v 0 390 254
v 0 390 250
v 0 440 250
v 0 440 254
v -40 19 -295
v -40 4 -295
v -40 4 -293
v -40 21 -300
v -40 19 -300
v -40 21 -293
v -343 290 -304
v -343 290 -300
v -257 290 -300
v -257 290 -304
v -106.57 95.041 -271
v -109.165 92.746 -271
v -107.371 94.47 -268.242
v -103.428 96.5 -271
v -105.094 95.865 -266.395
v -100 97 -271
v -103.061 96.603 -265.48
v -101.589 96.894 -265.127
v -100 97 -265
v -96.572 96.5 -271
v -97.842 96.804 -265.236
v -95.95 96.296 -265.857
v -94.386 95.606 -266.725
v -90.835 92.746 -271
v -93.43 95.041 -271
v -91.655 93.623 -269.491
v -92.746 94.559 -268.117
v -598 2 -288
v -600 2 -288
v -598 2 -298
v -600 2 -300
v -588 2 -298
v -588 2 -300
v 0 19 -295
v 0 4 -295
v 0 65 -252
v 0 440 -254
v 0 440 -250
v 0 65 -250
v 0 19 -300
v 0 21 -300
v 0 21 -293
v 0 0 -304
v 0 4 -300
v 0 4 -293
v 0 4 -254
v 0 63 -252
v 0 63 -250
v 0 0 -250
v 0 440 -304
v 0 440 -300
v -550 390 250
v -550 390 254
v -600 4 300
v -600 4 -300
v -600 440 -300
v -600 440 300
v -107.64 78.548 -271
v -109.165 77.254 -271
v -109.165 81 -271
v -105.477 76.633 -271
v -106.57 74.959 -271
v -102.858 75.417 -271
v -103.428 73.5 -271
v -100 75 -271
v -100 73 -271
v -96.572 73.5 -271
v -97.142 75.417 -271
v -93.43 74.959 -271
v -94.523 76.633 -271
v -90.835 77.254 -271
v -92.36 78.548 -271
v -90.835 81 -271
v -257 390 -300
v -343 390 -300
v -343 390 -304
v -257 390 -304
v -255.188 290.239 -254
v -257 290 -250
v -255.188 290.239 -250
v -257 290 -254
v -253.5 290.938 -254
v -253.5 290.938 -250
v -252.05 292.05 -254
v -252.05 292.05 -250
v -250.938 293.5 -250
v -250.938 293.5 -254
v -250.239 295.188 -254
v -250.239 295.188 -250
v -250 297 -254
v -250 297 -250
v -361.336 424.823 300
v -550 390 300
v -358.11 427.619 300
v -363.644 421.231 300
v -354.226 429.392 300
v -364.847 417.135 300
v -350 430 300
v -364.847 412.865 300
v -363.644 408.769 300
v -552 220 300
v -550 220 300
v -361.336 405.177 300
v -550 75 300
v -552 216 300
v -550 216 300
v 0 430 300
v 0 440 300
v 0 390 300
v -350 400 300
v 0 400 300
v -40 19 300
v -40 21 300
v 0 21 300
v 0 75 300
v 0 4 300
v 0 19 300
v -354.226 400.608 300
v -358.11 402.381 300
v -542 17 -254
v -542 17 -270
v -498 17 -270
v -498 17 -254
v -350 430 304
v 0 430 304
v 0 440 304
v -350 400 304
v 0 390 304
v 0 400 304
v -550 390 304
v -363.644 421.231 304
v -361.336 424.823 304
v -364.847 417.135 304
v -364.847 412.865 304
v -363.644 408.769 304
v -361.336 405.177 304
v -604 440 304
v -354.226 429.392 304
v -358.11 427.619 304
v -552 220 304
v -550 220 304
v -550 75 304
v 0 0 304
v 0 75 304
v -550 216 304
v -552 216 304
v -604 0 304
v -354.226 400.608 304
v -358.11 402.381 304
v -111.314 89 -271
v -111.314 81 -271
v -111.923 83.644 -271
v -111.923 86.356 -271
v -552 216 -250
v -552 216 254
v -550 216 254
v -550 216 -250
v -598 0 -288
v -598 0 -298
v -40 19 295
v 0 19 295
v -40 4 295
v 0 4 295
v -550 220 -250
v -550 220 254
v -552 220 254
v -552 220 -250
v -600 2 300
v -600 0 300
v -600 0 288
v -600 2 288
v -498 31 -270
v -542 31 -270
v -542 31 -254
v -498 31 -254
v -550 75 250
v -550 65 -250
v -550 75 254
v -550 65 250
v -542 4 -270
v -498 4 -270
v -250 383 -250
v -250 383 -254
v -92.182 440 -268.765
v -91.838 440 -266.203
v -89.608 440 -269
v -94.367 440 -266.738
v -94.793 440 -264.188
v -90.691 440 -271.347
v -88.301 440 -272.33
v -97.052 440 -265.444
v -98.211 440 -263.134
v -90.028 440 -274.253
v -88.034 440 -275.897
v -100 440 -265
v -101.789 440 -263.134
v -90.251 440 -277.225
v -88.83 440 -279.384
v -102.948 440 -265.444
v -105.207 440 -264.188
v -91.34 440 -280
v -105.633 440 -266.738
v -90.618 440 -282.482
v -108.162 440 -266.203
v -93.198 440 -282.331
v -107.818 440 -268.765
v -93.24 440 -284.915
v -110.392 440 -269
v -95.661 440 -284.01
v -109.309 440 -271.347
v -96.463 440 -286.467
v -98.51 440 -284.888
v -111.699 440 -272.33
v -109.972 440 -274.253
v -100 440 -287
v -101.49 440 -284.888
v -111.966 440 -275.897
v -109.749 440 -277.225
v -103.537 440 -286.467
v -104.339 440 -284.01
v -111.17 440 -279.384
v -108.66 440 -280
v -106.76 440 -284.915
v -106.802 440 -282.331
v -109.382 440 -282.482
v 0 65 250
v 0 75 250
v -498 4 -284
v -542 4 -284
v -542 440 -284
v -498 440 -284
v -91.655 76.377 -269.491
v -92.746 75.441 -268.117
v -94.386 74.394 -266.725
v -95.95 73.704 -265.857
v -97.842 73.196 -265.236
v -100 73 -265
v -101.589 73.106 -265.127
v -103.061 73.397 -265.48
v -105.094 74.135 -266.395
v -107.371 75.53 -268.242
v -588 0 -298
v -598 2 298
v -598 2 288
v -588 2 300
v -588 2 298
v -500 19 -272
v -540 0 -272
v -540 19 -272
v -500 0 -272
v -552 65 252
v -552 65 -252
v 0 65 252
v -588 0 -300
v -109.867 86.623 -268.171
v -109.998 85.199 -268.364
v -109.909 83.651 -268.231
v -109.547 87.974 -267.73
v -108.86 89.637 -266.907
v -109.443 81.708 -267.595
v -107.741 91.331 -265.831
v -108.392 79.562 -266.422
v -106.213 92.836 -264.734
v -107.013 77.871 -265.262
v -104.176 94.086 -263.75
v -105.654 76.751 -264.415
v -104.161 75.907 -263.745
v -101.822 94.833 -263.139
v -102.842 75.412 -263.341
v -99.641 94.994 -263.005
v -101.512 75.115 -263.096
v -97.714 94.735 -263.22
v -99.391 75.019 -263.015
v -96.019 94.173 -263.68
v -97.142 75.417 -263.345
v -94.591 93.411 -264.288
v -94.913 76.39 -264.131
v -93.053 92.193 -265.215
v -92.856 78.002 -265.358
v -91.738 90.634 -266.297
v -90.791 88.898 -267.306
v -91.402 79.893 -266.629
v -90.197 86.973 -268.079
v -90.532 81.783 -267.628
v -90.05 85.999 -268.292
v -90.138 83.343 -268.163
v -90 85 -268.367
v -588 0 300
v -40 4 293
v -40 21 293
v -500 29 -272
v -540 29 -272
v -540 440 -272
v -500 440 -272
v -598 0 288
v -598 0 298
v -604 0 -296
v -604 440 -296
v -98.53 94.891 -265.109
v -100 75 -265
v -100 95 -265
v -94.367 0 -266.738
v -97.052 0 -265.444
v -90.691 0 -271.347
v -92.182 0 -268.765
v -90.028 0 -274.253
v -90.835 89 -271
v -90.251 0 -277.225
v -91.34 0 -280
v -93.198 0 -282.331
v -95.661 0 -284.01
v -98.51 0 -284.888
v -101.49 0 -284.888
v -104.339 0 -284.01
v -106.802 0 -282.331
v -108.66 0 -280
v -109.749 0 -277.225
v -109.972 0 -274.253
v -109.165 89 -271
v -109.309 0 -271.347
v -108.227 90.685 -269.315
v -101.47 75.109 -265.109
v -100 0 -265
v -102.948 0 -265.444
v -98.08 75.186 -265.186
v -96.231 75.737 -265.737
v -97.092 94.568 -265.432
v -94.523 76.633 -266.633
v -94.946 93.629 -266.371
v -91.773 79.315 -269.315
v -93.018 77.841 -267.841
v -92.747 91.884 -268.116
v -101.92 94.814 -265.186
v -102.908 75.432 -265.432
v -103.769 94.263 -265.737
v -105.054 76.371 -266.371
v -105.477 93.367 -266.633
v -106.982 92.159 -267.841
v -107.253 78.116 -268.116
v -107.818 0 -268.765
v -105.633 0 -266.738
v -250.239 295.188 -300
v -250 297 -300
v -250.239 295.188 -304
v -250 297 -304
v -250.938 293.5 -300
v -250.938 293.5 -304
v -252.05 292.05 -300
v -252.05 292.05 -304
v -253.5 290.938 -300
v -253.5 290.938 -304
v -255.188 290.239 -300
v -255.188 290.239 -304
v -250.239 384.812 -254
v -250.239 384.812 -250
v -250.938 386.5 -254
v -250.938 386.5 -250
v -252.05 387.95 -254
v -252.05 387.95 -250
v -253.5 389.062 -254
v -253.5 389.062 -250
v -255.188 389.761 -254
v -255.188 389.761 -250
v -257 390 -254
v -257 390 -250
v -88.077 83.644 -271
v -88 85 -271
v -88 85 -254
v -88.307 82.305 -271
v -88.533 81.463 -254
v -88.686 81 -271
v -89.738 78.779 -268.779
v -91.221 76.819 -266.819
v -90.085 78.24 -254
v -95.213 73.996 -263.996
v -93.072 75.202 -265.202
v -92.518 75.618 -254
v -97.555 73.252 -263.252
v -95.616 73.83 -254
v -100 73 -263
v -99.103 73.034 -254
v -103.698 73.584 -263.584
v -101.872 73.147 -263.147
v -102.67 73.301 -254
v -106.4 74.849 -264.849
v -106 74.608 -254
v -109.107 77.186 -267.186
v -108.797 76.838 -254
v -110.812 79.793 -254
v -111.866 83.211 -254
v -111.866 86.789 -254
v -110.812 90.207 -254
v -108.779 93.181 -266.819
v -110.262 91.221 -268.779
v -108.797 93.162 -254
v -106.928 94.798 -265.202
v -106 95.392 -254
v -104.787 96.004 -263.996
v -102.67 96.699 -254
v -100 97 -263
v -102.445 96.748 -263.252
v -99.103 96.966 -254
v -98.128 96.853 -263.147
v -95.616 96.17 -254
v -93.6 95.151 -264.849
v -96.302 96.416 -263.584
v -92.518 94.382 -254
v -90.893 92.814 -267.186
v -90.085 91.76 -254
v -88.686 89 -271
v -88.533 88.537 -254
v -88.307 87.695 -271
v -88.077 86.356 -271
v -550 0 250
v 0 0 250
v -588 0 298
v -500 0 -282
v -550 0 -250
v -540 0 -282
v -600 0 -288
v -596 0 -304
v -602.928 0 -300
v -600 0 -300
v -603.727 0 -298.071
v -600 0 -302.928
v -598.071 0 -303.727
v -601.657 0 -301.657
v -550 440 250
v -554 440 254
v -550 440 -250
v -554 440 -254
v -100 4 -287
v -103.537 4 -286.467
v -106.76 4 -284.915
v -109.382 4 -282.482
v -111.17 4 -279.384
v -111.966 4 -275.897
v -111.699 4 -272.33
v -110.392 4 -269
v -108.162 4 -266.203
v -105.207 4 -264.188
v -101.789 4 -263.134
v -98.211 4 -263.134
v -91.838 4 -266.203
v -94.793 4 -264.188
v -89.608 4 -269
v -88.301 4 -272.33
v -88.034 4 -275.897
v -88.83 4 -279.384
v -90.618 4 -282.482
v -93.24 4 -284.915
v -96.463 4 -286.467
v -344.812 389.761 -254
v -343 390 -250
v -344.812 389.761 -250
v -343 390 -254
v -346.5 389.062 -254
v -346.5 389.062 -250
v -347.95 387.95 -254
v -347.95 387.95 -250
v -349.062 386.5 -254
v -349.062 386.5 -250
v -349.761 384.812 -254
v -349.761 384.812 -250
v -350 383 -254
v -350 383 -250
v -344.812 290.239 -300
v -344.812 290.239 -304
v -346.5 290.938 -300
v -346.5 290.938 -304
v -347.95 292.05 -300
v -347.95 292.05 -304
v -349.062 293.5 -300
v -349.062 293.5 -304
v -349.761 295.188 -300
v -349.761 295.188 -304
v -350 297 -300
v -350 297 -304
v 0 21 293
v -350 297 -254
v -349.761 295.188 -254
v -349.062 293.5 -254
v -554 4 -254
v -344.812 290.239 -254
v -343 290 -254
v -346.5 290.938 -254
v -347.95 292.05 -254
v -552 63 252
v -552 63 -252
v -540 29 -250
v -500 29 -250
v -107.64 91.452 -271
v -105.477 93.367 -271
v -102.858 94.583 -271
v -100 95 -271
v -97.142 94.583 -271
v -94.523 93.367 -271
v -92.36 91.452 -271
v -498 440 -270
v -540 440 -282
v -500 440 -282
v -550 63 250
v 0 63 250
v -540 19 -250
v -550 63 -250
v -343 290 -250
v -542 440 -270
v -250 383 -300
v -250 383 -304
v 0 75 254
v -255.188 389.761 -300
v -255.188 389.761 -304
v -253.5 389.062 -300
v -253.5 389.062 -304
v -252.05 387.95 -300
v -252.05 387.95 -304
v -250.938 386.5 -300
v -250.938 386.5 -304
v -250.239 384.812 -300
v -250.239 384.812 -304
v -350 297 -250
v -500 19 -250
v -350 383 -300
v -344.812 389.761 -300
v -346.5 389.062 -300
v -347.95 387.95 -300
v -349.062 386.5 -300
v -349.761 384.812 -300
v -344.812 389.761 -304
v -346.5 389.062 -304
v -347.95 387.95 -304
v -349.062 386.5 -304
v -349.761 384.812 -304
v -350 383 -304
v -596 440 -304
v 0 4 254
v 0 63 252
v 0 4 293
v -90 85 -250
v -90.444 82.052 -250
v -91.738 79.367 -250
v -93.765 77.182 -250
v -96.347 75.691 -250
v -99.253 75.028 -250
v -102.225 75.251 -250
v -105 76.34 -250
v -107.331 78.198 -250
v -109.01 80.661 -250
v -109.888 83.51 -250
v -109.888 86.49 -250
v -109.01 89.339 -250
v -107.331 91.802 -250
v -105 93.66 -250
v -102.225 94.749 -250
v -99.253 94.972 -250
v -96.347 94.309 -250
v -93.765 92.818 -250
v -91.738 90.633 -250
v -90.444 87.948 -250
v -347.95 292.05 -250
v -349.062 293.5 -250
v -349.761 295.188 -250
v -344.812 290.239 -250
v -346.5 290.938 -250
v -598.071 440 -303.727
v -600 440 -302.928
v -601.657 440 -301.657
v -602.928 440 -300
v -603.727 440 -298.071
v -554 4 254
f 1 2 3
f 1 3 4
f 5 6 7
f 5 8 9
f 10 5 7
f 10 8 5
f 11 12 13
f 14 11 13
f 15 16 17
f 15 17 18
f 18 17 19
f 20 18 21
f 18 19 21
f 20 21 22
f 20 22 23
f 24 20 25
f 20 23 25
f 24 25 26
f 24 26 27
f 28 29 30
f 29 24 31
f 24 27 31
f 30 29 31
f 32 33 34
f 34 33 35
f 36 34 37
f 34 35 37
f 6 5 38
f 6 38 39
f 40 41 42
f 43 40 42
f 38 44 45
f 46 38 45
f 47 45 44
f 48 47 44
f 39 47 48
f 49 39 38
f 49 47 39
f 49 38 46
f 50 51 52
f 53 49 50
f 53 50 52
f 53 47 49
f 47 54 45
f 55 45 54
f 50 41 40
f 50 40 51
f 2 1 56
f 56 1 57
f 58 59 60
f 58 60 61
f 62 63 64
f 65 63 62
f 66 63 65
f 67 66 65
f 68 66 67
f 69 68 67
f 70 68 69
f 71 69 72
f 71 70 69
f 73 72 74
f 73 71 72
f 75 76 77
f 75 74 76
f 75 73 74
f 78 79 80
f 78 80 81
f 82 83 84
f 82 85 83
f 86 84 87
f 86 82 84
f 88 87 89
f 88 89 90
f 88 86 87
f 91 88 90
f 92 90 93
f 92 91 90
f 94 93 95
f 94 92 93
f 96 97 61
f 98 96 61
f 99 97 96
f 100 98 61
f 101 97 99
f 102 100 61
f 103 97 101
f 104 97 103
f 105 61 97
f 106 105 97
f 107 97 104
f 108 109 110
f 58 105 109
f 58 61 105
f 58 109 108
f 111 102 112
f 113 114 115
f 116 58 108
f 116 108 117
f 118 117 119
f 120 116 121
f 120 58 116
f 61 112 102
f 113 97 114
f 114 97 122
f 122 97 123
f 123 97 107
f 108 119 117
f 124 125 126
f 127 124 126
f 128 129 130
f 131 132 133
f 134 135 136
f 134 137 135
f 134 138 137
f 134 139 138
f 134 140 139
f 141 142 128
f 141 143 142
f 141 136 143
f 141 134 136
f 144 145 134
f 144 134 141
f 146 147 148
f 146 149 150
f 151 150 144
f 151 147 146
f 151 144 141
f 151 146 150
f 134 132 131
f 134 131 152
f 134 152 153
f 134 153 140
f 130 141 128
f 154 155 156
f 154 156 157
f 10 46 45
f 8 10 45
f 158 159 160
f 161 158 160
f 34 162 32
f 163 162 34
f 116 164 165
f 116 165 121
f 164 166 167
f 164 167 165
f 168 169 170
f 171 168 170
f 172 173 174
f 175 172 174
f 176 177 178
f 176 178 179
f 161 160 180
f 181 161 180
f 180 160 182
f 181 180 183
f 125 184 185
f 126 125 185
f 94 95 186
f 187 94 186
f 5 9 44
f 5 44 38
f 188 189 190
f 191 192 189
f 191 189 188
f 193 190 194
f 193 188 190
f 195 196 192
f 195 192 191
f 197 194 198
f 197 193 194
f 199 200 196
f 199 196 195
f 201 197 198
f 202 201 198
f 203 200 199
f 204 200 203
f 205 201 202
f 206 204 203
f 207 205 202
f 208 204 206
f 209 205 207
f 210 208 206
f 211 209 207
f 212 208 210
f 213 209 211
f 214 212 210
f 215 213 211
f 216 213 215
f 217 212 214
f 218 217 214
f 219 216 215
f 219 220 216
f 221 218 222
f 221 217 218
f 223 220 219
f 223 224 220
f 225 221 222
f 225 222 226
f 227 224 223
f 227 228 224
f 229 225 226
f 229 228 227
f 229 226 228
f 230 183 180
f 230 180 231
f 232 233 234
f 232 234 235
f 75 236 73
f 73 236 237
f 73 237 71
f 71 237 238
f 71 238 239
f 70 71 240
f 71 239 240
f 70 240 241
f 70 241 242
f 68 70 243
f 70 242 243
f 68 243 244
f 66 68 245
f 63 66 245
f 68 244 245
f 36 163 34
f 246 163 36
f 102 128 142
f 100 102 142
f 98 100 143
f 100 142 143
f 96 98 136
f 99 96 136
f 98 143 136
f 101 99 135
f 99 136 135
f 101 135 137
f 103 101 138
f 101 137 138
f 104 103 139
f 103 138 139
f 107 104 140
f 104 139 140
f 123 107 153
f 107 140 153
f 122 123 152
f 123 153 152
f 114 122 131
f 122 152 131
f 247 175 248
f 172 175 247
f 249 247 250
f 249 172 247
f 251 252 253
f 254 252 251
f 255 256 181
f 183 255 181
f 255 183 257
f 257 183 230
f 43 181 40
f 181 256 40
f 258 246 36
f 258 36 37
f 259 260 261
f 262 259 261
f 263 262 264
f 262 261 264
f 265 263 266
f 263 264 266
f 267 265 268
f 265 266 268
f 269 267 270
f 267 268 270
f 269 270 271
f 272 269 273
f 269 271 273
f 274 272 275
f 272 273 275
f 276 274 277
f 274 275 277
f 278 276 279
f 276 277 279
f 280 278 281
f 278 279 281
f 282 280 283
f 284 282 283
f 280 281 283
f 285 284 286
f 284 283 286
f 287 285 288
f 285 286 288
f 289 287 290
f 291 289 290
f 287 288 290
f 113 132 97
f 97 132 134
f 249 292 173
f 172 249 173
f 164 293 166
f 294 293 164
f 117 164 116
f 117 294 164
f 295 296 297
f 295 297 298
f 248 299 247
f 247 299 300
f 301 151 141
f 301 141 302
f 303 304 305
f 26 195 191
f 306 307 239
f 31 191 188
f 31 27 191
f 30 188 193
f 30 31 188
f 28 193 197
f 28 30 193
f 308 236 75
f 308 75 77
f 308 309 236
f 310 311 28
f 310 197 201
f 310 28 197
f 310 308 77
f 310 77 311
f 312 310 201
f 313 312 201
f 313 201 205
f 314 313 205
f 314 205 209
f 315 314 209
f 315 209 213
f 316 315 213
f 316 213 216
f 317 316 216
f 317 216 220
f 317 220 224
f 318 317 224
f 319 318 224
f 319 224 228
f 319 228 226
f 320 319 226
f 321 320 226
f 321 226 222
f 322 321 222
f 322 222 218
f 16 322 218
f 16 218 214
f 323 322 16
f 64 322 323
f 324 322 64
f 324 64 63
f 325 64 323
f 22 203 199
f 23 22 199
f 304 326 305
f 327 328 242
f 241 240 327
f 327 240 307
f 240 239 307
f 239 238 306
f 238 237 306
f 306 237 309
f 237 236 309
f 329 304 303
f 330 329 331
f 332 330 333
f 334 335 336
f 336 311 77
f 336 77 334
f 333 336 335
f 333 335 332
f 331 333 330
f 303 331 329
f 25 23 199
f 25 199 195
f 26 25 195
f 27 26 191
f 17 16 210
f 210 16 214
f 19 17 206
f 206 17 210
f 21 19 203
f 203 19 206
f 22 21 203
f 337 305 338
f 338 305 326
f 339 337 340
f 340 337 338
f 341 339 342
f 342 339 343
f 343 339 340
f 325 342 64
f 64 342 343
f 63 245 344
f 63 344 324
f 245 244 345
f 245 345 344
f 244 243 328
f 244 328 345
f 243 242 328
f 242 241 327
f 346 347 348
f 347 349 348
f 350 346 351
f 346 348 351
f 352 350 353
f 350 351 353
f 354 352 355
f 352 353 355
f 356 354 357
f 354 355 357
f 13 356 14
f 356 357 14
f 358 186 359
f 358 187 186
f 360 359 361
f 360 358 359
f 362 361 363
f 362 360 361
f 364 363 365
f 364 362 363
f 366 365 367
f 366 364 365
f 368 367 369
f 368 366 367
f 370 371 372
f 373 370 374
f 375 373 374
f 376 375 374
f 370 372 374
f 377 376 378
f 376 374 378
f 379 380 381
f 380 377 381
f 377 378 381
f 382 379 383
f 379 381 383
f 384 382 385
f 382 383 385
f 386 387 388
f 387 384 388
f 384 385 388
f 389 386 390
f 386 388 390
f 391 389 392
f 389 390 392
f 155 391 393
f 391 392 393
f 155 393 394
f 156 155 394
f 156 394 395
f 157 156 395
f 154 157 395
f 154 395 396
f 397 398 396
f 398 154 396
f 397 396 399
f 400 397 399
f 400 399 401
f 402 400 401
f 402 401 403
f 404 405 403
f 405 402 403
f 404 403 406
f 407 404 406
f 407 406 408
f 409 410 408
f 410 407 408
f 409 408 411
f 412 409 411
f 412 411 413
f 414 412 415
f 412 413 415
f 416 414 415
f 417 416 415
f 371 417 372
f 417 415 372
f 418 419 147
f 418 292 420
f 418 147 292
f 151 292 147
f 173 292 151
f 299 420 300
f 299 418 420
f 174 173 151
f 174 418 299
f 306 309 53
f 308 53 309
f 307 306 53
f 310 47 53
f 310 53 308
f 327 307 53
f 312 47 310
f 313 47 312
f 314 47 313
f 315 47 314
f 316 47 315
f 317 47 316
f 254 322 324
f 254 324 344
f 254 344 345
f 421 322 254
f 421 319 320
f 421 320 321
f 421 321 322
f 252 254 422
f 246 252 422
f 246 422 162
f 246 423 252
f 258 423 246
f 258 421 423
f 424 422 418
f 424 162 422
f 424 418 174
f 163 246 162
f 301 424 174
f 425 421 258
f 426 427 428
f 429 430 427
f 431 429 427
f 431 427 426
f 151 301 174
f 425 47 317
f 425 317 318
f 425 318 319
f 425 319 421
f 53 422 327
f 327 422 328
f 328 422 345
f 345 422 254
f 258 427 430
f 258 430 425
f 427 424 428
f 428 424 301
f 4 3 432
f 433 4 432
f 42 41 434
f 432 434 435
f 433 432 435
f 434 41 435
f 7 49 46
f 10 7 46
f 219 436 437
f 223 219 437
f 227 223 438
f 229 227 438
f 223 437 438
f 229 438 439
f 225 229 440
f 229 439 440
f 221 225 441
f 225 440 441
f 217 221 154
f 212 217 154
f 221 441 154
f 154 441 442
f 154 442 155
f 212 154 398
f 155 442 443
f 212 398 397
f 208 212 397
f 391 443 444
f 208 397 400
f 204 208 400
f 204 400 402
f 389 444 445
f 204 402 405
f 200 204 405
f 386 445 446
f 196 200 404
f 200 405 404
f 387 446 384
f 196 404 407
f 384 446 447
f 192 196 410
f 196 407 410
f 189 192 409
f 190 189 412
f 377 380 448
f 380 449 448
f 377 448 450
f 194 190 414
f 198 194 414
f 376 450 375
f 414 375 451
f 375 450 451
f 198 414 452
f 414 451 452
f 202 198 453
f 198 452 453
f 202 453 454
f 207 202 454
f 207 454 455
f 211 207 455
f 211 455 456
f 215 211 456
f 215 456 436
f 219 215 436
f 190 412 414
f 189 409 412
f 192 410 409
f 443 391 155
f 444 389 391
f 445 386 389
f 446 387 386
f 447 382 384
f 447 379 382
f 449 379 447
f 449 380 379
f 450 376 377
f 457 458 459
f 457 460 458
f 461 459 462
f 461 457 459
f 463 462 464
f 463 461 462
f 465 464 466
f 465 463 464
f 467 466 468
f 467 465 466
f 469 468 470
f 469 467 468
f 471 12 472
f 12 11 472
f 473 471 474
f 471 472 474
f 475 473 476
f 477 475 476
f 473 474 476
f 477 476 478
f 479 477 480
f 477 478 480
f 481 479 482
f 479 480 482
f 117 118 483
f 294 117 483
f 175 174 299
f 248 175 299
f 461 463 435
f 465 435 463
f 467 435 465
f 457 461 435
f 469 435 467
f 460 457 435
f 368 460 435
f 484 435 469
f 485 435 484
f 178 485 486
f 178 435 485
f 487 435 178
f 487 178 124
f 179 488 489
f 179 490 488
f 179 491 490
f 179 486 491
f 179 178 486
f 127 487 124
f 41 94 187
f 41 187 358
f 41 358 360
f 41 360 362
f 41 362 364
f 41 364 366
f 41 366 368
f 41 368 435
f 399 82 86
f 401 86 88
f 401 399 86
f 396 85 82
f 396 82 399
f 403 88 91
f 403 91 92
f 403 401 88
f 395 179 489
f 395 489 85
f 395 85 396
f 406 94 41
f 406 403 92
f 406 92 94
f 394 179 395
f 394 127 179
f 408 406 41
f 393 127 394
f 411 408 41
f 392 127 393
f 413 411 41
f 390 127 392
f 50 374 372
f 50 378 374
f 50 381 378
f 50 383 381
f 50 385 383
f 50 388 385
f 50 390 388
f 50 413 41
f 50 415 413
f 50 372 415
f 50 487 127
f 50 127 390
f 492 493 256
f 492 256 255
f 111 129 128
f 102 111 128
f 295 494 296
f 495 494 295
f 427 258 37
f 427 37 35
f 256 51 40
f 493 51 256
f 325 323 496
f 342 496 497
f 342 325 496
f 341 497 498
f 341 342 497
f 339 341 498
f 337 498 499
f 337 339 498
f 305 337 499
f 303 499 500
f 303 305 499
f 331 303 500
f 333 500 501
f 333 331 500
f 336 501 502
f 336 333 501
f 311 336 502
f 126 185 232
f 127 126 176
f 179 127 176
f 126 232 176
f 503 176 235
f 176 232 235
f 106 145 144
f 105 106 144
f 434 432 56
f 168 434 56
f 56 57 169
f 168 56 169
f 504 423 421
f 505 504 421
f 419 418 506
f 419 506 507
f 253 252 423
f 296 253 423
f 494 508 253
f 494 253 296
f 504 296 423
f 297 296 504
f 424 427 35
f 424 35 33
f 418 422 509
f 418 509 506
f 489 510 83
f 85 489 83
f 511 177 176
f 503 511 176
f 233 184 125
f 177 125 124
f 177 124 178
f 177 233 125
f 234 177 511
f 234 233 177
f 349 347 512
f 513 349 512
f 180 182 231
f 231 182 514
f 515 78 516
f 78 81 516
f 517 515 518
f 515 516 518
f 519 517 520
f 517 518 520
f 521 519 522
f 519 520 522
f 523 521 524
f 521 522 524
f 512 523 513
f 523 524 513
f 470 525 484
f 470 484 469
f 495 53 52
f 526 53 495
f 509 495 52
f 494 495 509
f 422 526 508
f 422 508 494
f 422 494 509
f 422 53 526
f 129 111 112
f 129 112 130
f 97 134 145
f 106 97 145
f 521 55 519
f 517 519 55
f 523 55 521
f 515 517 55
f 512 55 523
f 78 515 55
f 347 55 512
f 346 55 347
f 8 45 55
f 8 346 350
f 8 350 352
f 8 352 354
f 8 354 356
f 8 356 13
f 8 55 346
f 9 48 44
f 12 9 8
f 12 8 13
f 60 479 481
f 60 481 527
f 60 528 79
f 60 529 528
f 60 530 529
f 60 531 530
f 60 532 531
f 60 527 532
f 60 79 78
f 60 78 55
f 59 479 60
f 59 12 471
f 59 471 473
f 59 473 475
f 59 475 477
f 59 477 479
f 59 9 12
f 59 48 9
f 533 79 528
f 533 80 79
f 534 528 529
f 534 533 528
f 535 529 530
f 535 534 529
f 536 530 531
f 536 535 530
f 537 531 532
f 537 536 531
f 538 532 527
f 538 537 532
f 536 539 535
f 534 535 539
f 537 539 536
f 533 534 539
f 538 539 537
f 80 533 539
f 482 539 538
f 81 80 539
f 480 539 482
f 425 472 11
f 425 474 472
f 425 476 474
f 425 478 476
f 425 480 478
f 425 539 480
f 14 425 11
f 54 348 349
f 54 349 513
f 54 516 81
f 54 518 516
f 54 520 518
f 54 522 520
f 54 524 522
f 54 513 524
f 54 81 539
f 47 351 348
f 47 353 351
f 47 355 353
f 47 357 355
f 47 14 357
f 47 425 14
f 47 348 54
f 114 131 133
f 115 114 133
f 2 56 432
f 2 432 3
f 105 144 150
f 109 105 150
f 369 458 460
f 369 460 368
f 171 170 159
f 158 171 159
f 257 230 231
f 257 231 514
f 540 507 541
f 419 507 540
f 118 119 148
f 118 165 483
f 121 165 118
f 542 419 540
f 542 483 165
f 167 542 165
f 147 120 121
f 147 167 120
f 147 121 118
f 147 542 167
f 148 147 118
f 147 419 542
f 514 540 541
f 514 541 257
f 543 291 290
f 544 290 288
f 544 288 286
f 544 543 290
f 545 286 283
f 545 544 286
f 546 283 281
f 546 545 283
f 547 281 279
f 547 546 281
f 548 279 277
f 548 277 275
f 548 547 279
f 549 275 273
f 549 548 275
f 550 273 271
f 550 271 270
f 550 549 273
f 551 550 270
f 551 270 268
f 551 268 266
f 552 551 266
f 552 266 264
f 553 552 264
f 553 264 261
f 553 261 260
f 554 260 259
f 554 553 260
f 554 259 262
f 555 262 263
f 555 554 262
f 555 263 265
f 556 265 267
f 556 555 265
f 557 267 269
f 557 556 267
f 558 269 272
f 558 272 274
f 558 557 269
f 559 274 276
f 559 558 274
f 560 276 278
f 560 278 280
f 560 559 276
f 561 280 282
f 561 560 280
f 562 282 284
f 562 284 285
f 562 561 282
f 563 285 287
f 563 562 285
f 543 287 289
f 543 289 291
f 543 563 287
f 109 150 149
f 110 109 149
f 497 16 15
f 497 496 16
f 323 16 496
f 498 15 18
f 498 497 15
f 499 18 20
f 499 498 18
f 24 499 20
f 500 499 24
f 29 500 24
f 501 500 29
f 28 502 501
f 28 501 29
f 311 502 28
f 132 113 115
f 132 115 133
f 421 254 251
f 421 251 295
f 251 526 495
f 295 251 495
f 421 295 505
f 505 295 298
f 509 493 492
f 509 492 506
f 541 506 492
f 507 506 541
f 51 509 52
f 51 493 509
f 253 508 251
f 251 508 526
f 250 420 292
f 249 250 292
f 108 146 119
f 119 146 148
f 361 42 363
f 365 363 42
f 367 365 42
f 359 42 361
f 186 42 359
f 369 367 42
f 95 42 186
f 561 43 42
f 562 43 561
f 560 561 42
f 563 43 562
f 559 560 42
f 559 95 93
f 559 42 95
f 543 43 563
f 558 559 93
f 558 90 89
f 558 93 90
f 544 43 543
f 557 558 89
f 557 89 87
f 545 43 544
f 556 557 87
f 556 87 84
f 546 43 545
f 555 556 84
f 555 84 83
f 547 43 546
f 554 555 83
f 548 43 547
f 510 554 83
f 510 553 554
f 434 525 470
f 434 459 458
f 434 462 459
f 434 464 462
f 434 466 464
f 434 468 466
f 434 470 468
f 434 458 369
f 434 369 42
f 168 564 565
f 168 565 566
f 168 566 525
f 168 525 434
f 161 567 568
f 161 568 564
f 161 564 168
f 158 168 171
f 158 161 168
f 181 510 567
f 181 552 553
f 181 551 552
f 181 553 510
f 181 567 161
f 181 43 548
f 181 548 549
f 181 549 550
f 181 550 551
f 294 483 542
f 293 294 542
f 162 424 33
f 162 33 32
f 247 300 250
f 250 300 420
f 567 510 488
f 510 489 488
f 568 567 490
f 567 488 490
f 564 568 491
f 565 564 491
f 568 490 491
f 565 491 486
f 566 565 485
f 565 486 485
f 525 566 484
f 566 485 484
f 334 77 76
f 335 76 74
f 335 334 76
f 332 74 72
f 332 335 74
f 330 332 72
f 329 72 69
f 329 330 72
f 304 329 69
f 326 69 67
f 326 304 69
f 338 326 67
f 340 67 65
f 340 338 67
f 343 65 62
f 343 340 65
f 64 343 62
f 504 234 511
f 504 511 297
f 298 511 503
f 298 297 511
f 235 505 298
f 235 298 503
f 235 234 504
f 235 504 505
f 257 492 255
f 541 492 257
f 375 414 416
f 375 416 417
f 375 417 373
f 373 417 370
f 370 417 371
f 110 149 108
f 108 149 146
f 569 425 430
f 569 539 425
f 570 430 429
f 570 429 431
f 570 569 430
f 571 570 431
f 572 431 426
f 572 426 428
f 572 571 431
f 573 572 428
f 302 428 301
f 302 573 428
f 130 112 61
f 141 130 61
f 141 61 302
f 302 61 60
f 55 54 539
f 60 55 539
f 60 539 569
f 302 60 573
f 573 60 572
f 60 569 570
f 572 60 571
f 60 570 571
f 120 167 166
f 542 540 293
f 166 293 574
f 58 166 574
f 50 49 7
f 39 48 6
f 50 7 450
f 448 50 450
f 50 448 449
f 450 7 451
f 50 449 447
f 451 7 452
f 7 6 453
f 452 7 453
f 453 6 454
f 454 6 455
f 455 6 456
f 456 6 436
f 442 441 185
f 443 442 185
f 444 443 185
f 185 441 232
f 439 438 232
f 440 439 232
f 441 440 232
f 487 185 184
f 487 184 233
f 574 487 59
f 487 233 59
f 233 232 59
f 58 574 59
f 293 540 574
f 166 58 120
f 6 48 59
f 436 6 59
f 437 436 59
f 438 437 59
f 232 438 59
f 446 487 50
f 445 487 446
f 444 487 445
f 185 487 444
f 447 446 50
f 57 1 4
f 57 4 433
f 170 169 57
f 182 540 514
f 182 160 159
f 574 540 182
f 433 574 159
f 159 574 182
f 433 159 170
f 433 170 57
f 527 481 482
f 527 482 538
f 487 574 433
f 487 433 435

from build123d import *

# Parameters (mm, degrees)
BOSS_EXTRUDE1_DEPTH             = 440
BOSS_EXTRUDE2_DEPTH             = 440
BOSS_EXTRUDE3_DEPTH             = 4
SKETCH4_W                       = 500
SKETCH4_H                       = 4
CUT_EXTRUDE1_DEPTH              = 2
CUT_EXTRUDE3_DEPTH              = 1
CUT_EXTRUDE3_DEPTH_BACK         = 1
CUT_EXTRUDE6_DEPTH              = 54
BOSS_EXTRUDE6_DEPTH             = 40
BOSS_EXTRUDE5_DEPTH             = 40
CUT_EXTRUDE9_DEPTH              = 4
SKETCH14_W                      = 100
SKETCH14_H                      = 100
CUT_EXTRUDE10_DEPTH             = 931.23222907
FILLET1_R                       = 7
FILLET2_R                       = 8
CUT_EXTRUDE11_DEPTH             = 2
SKETCH17_W                      = 40
SKETCH17_H                      = 10
CUT_EXTRUDE12_DEPTH             = 10
SKETCH18_W                      = 44
SKETCH18_H                      = 14
SKETCH18_W_2                    = 40
SKETCH18_H_2                    = 10
BOSS_EXTRUDE7_DEPTH             = 436
CUT_EXTRUDE13_REACH             = 944.28
SKETCH19_W                      = 40
SKETCH19_H                      = 10
CUT_EXTRUDE13_DIRECTION_2_DEPTH = 2
SKETCH20_W                      = 44
SKETCH20_H                      = 14
SKETCH20_W_2                    = 40
SKETCH20_H_2                    = 10
BOSS_EXTRUDE8_DEPTH             = 16
SKETCH21_R                      = 10
CUT_EXTRUDE14_DEPTH             = 25
SKETCH25_R                      = 12
SKETCH25_R_2                    = 10
BOSS_EXTRUDE10_DEPTH            = 17
SKETCH22_R                      = 10
CUT_EXTRUDE15_DEPTH             = 4
SKETCH23_R                      = 12
SKETCH23_R_2                    = 10
BOSS_EXTRUDE9_DEPTH             = 436


with BuildPart() as part:
    # Sketch1 → Boss-Extrude1 (new body)
    with BuildSketch(Plane(origin=(0, 0, 0), x_dir=(1, 0, 0), z_dir=(0, 1, 0))):
        Polygon((0, 300), (-600, 300), (-600, -300), (0, -300), (0, -304), (-604, -304), (-604, 304), (0, 304), align=None)
    extrude(amount=BOSS_EXTRUDE1_DEPTH)



with BuildPart() as body_2:
    # Sketch2 → Boss-Extrude2 (new body)
    with BuildSketch(Plane(origin=(0, 0, 0), x_dir=(1, 0, 0), z_dir=(0, 1, 0))):
        Polygon((0, 250), (-550, 250), (-550, -250), (0, -250), (0, -254), (-554, -254), (-554, 254), (0, 254), align=None)
    extrude(amount=BOSS_EXTRUDE2_DEPTH)


with BuildPart() as part_1:
    add(part.part)

    add(body_2.part)  # Boss-Extrude3 merges body 2
    # Sketch3 → Boss-Extrude3 (add)
    with BuildSketch(Plane(origin=(0, 0, 0), x_dir=(1, 0, 0), z_dir=(0, 1, 0))):
        Polygon((0, -254), (0, -300), (-600, -300), (-600, 300), (0, 300), (0, 254), (-554, 254), (-554, -254), align=None)
    extrude(amount=BOSS_EXTRUDE3_DEPTH)

    # Sketch4 → Cut-Extrude1 (cut)
    with BuildSketch(Plane(origin=(-550, 0, 0), x_dir=(0, 0, -1), z_dir=(1, 0, 0))):
        with Locations((0, 218)):
            Rectangle(SKETCH4_W, SKETCH4_H)
    extrude(amount=-CUT_EXTRUDE1_DEPTH, mode=Mode.SUBTRACT)

    # Sketch7 → Cut-Extrude3 (cut, two sides)
    with BuildSketch(Plane(origin=(0, 64, 0), x_dir=(1, 0, 0), z_dir=(0, 1, 0))) as cut_extrude3_sk:
        Polygon((-550, 250), (0, 250), (0, 252), (-552, 252), (-552, -252), (0, -252), (0, -250), (-550, -250), align=None)
    extrude(amount=CUT_EXTRUDE3_DEPTH, mode=Mode.SUBTRACT)
    extrude(cut_extrude3_sk.sketch, amount=-CUT_EXTRUDE3_DEPTH_BACK, mode=Mode.SUBTRACT)

    # Sketch10 → Cut-Extrude6 (cut)
    with BuildSketch(Plane.XY.offset(304)):
        Polygon((0, 390), (-550, 390), (-550, 220), (-552, 220), (-552, 216), (-550, 216), (-550, 75), (0, 75), align=None)
    extrude(amount=-CUT_EXTRUDE6_DEPTH, mode=Mode.SUBTRACT)

    # Sketch11 → Boss-Extrude6 (add)
    with BuildSketch(Plane(origin=(0, 0, 0), x_dir=(0, 0, -1), z_dir=(1, 0, 0))):
        Polygon((-295, 4), (-295, 19), (-300, 19), (-300, 21), (-293, 21), (-293, 4), align=None)
    extrude(amount=-BOSS_EXTRUDE6_DEPTH)

    # Sketch12 → Boss-Extrude5 (add)
    with BuildSketch(Plane(origin=(0, 0, 0), x_dir=(0, 0, -1), z_dir=(1, 0, 0))):
        Polygon((295, 4), (293, 4), (293, 21), (300, 21), (300, 19), (295, 19), align=None)
    extrude(amount=-BOSS_EXTRUDE5_DEPTH)

    # Sketch13 → Cut-Extrude9 (cut)
    with BuildSketch(Plane.XY.offset(304)):
        with BuildLine():
            Line((0, 400), (0, 430))
            Line((0, 430), (-350, 430))
            ThreePointArc((-350, 430), (-365, 415), (-350, 400))
            Line((-350, 400), (0, 400))
        make_face()
    extrude(amount=-CUT_EXTRUDE9_DEPTH, mode=Mode.SUBTRACT)

    # Sketch14 → Cut-Extrude10 (cut, through all)
    with BuildSketch(Plane.XY.offset(-250)):
        with Locations((-300, 340)):
            Rectangle(SKETCH14_W, SKETCH14_H)
    extrude(amount=-CUT_EXTRUDE10_DEPTH, mode=Mode.SUBTRACT)

    # Fillet1
    fillet1_edges = [part_1.edges().sort_by_distance(p)[0] for p in [
        (-350, 290, -302),
        (-350, 290, -252),
        (-350, 390, -302),
        (-350, 390, -252),
        (-250, 390, -302),
        (-250, 390, -252),
        (-250, 290, -302),
        (-250, 290, -252),
    ]]
    fillet(fillet1_edges, radius=FILLET1_R)

    # Fillet2
    fillet2_edges = [part_1.edges().sort_by_distance(p)[0] for p in [
        (-604, 220, -304),
    ]]
    fillet(fillet2_edges, radius=FILLET2_R)

    # Sketch15 → Cut-Extrude11 (cut)
    with BuildSketch(Plane.XZ):
        Polygon((-600, 300), (-600, 288), (-598, 288), (-598, 298), (-588, 298), (-588, 300), align=None)
    cut_extrude11 = extrude(amount=-CUT_EXTRUDE11_DEPTH, mode=Mode.SUBTRACT)

    # Mirror1: Cut-Extrude11 across plane
    add(cut_extrude11.mirror(Plane.XY), mode=Mode.SUBTRACT)

    # Sketch17 → Cut-Extrude12 (cut)
    with BuildSketch(Plane(origin=(0, 4, 0), x_dir=(1, 0, 0), z_dir=(0, 1, 0))):
        with Locations((-520, 277)):
            Rectangle(SKETCH17_W, SKETCH17_H)
    extrude(amount=-CUT_EXTRUDE12_DEPTH, mode=Mode.SUBTRACT)

    # Sketch18 → Boss-Extrude7 (add)
    with BuildSketch(Plane(origin=(0, 4, 0), x_dir=(1, 0, 0), z_dir=(0, 1, 0))):
        with Locations((-520, 277)):
            Rectangle(SKETCH18_W, SKETCH18_H)
        with Locations((-520, 277)):
            Rectangle(SKETCH18_W_2, SKETCH18_H_2, mode=Mode.SUBTRACT)
    extrude(amount=BOSS_EXTRUDE7_DEPTH)

    # Cut-Extrude13: up to this face of the body (flat: up to its plane)
    cut_extrude13_end = Plane(part_1.part.faces().sort_by_distance((-273.743044457, 248.059881287, -250))[0])
    # Sketch19 → Cut-Extrude13 (cut, up to the picked face)
    with BuildSketch(Plane.XY.offset(-270), mode=Mode.PRIVATE) as cut_extrude13_sk1:
        with Locations((-520, 24)):
            Rectangle(SKETCH19_W, SKETCH19_H)
    cut_extrude13_tool1 = split(extrude(cut_extrude13_sk1.sketch, amount=CUT_EXTRUDE13_REACH, mode=Mode.PRIVATE), bisect_by=cut_extrude13_end, keep=Keep.BOTH, mode=Mode.PRIVATE)
    add(cut_extrude13_tool1.solids().sort_by(Axis((-520, 24, -270), (0, 0, 1)))[0], mode=Mode.SUBTRACT)

    # Sketch19 → Cut-Extrude13 direction 2 (cut)
    with BuildSketch(Plane.XY.offset(-270)):
        with Locations((-520, 24)):
            Rectangle(SKETCH19_W, SKETCH19_H)
    extrude(amount=-CUT_EXTRUDE13_DIRECTION_2_DEPTH, mode=Mode.SUBTRACT)

    # Sketch20 → Boss-Extrude8 (add)
    with BuildSketch(Plane.XY.offset(-270)):
        with Locations((-520, 24)):
            Rectangle(SKETCH20_W, SKETCH20_H)
        with Locations((-520, 24)):
            Rectangle(SKETCH20_W_2, SKETCH20_H_2, mode=Mode.SUBTRACT)
    extrude(amount=BOSS_EXTRUDE8_DEPTH)

    # Sketch21 → Cut-Extrude14 (cut)
    with BuildSketch(Plane.XY.offset(-250)):
        with Locations((-100, 85)):
            Circle(SKETCH21_R)
    extrude(amount=-CUT_EXTRUDE14_DEPTH, mode=Mode.SUBTRACT)

    # Sketch25 → Boss-Extrude10 (add)
    with BuildSketch(Plane(origin=(0, 0, -254), x_dir=(-1, 0, 0), z_dir=(0, 0, -1))):
        with Locations(Location((100, 85, 0), (0, 0, 180))):
            Circle(SKETCH25_R)
        with Locations(Location((100, 85, 0), (0, 0, 180))):
            Circle(SKETCH25_R_2, mode=Mode.SUBTRACT)
    extrude(amount=BOSS_EXTRUDE10_DEPTH)

    # Sketch22 → Cut-Extrude15 (cut)
    with BuildSketch(Plane(origin=(0, 4, 0), x_dir=(1, 0, 0), z_dir=(0, 1, 0))):
        with Locations(Location((-100, 275, 0), (0, 0, 270))):
            Circle(SKETCH22_R)
    extrude(amount=-CUT_EXTRUDE15_DEPTH, mode=Mode.SUBTRACT)

    # Sketch23 → Boss-Extrude9 (add)
    with BuildSketch(Plane(origin=(0, 4, 0), x_dir=(1, 0, 0), z_dir=(0, 1, 0))):
        with Locations(Location((-100, 275, 0), (0, 0, 90))):
            Circle(SKETCH23_R)
        with Locations(Location((-100, 275, 0), (0, 0, 270))):
            Circle(SKETCH23_R_2, mode=Mode.SUBTRACT)
    extrude(amount=BOSS_EXTRUDE9_DEPTH)


solid = part_1.part
